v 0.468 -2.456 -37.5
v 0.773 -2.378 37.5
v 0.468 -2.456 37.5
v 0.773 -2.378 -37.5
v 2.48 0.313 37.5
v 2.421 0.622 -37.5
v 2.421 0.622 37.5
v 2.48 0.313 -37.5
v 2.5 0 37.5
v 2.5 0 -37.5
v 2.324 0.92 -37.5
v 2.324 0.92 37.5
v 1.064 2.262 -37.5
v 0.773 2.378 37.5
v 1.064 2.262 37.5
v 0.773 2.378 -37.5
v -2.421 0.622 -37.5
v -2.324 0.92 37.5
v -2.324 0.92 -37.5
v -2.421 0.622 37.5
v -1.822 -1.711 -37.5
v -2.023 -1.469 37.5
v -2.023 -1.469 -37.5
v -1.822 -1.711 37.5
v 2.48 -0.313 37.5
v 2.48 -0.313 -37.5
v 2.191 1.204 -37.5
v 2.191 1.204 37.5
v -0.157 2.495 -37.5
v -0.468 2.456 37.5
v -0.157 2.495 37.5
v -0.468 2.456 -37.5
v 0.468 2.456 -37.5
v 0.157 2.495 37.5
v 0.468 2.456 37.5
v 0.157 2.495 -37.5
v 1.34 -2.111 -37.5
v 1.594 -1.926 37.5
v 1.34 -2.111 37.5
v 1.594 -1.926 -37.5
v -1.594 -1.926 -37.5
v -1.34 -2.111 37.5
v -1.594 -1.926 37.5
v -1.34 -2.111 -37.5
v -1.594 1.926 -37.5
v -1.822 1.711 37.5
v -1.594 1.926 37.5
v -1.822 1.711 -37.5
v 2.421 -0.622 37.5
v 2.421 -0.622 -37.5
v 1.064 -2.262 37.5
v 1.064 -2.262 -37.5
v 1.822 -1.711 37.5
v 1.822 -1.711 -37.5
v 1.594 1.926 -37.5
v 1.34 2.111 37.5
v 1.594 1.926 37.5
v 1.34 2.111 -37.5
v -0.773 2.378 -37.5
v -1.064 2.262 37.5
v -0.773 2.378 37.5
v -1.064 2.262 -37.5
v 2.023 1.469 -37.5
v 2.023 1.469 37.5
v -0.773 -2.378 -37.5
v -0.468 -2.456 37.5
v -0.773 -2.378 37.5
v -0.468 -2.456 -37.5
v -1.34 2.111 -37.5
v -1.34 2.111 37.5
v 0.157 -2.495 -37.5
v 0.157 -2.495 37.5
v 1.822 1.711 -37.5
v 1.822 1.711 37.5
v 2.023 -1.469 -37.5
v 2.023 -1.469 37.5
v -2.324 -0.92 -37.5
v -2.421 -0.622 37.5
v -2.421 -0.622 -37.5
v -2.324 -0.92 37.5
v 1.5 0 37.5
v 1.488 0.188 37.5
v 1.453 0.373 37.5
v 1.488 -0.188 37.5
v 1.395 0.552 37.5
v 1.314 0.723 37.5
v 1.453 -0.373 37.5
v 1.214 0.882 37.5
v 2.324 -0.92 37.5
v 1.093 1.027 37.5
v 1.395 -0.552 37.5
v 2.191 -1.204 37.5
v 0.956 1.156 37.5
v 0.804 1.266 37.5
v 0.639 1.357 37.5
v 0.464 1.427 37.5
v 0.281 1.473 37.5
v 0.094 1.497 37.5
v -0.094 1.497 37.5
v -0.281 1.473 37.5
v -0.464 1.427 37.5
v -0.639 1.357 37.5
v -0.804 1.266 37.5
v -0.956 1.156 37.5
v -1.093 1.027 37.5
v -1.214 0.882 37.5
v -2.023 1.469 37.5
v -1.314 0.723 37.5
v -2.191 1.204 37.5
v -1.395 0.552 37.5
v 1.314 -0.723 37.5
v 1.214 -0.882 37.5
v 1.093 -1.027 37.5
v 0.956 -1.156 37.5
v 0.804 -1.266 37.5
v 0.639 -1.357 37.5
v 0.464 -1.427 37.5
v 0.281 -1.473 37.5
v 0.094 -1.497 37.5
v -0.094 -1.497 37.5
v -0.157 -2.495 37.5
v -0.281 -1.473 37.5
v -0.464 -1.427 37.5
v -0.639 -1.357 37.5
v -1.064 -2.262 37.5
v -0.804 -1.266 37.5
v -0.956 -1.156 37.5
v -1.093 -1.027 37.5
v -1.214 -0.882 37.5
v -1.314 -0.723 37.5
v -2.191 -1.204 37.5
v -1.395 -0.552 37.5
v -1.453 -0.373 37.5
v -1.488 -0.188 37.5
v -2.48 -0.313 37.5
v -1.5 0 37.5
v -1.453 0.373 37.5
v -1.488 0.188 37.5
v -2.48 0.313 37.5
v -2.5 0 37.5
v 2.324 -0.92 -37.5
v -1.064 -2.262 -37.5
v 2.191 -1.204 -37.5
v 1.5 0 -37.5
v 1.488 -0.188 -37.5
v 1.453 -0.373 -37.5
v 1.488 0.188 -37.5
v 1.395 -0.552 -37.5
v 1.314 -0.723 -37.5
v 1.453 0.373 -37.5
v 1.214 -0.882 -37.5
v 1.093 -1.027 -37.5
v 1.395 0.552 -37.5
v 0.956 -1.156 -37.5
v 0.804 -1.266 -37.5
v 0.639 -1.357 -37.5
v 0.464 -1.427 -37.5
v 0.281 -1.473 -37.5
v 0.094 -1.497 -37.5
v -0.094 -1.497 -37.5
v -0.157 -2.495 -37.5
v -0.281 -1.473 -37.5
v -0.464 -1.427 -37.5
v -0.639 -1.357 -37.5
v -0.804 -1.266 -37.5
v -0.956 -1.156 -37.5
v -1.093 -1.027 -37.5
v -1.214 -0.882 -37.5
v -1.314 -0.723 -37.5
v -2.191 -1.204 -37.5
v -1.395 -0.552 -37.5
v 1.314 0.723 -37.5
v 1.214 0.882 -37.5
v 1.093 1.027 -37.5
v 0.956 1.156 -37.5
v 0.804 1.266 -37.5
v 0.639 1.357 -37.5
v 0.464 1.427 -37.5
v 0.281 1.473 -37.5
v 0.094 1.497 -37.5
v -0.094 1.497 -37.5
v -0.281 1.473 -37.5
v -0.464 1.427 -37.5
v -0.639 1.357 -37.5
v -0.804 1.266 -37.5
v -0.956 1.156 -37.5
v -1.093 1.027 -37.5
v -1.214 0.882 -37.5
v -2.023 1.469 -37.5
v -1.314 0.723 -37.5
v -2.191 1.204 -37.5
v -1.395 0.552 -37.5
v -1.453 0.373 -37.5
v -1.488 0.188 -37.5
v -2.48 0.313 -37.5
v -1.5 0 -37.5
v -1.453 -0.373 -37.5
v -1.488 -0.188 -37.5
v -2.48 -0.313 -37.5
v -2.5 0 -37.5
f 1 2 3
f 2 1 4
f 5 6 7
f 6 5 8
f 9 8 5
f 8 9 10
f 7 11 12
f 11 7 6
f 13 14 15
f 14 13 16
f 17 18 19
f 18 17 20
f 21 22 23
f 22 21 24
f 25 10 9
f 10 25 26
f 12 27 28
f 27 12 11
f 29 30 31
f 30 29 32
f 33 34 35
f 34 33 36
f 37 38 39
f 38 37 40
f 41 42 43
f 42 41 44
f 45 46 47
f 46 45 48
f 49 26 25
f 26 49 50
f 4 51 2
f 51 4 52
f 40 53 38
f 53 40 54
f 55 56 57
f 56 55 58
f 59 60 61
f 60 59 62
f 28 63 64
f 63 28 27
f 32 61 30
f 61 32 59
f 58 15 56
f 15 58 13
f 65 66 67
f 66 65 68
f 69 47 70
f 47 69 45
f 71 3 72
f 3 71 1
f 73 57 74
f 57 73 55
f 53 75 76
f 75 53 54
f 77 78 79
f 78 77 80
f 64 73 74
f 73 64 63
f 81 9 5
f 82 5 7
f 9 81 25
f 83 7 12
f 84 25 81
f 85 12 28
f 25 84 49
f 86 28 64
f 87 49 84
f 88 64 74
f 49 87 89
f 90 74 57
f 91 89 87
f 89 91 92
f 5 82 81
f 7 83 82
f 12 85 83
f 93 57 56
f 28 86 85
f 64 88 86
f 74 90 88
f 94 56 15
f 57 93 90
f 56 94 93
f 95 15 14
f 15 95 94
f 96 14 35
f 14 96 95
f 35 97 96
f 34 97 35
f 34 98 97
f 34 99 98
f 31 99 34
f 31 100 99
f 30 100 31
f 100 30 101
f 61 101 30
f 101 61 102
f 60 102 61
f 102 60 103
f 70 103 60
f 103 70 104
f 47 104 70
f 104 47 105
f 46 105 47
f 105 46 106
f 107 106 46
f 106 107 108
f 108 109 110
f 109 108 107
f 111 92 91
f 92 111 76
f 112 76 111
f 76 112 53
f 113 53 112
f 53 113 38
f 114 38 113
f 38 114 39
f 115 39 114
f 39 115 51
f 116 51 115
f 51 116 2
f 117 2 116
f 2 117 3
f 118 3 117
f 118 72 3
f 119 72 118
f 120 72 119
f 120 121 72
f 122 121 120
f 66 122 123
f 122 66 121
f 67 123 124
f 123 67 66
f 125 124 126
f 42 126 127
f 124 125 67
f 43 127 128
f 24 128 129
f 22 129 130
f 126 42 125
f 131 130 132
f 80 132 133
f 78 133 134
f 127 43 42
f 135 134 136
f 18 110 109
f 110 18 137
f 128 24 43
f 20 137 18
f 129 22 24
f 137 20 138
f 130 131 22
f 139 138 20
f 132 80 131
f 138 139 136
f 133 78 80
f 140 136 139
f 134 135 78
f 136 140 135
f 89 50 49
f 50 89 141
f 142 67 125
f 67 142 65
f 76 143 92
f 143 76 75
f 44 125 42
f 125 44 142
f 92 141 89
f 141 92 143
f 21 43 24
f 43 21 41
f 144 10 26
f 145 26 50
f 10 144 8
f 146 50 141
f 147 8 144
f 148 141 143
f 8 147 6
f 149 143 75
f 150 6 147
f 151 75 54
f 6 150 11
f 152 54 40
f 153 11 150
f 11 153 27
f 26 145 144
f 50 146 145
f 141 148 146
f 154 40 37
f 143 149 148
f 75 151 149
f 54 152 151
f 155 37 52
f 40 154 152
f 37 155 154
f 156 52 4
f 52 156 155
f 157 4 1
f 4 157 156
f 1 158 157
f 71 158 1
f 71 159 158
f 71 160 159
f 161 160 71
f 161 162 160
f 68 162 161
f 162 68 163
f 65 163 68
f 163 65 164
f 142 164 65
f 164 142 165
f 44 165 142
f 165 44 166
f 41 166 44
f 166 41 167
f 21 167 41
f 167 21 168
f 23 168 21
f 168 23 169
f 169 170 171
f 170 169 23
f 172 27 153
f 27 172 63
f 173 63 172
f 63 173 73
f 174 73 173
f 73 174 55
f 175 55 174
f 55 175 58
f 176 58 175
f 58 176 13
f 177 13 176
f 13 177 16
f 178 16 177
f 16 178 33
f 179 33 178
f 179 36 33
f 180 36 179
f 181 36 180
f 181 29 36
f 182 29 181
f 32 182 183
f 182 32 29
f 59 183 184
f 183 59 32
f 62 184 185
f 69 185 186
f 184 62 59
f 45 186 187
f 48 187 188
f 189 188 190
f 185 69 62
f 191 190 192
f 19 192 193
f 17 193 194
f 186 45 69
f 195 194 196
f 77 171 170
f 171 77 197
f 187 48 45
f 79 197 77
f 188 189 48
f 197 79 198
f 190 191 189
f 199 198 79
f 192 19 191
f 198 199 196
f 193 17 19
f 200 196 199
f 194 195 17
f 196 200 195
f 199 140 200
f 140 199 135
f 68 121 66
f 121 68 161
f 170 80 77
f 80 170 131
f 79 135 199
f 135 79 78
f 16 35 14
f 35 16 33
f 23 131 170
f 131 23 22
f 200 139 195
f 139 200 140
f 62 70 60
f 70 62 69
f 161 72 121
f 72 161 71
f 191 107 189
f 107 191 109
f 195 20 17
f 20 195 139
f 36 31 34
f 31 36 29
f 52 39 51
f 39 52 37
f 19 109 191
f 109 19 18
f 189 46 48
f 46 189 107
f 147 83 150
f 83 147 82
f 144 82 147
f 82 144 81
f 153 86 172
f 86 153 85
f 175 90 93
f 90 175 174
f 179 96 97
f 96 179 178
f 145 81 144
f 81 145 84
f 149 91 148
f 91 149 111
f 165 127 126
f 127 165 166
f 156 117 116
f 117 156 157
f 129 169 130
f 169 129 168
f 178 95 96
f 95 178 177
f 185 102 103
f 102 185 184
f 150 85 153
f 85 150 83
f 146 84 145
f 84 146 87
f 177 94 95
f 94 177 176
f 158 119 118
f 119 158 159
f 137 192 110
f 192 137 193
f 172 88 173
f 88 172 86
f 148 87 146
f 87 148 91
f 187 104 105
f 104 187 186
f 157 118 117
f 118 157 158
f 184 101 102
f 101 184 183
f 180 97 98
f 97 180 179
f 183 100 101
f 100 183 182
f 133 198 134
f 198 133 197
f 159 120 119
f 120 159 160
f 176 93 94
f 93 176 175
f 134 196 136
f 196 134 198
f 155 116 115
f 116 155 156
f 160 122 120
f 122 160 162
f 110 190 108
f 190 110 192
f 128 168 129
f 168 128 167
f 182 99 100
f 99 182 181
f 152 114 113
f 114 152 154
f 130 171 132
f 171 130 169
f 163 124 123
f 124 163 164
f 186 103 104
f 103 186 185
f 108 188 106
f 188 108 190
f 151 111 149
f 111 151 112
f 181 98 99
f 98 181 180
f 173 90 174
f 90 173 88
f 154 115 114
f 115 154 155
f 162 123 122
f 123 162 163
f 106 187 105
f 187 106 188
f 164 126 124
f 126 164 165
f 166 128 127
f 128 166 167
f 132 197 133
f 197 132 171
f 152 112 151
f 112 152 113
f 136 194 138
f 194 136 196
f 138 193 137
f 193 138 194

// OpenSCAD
$fn = 50;


difference() {
	union() {
		translate(v = [0, 0, -37.5000000000]) {
			cylinder(h = 75, r = 2.5000000000);
		}
	}
	union() {
		translate(v = [0, 0, -100.0000000000]) {
			cylinder(h = 200, r = 1.5000000000);
		}
	}
}
